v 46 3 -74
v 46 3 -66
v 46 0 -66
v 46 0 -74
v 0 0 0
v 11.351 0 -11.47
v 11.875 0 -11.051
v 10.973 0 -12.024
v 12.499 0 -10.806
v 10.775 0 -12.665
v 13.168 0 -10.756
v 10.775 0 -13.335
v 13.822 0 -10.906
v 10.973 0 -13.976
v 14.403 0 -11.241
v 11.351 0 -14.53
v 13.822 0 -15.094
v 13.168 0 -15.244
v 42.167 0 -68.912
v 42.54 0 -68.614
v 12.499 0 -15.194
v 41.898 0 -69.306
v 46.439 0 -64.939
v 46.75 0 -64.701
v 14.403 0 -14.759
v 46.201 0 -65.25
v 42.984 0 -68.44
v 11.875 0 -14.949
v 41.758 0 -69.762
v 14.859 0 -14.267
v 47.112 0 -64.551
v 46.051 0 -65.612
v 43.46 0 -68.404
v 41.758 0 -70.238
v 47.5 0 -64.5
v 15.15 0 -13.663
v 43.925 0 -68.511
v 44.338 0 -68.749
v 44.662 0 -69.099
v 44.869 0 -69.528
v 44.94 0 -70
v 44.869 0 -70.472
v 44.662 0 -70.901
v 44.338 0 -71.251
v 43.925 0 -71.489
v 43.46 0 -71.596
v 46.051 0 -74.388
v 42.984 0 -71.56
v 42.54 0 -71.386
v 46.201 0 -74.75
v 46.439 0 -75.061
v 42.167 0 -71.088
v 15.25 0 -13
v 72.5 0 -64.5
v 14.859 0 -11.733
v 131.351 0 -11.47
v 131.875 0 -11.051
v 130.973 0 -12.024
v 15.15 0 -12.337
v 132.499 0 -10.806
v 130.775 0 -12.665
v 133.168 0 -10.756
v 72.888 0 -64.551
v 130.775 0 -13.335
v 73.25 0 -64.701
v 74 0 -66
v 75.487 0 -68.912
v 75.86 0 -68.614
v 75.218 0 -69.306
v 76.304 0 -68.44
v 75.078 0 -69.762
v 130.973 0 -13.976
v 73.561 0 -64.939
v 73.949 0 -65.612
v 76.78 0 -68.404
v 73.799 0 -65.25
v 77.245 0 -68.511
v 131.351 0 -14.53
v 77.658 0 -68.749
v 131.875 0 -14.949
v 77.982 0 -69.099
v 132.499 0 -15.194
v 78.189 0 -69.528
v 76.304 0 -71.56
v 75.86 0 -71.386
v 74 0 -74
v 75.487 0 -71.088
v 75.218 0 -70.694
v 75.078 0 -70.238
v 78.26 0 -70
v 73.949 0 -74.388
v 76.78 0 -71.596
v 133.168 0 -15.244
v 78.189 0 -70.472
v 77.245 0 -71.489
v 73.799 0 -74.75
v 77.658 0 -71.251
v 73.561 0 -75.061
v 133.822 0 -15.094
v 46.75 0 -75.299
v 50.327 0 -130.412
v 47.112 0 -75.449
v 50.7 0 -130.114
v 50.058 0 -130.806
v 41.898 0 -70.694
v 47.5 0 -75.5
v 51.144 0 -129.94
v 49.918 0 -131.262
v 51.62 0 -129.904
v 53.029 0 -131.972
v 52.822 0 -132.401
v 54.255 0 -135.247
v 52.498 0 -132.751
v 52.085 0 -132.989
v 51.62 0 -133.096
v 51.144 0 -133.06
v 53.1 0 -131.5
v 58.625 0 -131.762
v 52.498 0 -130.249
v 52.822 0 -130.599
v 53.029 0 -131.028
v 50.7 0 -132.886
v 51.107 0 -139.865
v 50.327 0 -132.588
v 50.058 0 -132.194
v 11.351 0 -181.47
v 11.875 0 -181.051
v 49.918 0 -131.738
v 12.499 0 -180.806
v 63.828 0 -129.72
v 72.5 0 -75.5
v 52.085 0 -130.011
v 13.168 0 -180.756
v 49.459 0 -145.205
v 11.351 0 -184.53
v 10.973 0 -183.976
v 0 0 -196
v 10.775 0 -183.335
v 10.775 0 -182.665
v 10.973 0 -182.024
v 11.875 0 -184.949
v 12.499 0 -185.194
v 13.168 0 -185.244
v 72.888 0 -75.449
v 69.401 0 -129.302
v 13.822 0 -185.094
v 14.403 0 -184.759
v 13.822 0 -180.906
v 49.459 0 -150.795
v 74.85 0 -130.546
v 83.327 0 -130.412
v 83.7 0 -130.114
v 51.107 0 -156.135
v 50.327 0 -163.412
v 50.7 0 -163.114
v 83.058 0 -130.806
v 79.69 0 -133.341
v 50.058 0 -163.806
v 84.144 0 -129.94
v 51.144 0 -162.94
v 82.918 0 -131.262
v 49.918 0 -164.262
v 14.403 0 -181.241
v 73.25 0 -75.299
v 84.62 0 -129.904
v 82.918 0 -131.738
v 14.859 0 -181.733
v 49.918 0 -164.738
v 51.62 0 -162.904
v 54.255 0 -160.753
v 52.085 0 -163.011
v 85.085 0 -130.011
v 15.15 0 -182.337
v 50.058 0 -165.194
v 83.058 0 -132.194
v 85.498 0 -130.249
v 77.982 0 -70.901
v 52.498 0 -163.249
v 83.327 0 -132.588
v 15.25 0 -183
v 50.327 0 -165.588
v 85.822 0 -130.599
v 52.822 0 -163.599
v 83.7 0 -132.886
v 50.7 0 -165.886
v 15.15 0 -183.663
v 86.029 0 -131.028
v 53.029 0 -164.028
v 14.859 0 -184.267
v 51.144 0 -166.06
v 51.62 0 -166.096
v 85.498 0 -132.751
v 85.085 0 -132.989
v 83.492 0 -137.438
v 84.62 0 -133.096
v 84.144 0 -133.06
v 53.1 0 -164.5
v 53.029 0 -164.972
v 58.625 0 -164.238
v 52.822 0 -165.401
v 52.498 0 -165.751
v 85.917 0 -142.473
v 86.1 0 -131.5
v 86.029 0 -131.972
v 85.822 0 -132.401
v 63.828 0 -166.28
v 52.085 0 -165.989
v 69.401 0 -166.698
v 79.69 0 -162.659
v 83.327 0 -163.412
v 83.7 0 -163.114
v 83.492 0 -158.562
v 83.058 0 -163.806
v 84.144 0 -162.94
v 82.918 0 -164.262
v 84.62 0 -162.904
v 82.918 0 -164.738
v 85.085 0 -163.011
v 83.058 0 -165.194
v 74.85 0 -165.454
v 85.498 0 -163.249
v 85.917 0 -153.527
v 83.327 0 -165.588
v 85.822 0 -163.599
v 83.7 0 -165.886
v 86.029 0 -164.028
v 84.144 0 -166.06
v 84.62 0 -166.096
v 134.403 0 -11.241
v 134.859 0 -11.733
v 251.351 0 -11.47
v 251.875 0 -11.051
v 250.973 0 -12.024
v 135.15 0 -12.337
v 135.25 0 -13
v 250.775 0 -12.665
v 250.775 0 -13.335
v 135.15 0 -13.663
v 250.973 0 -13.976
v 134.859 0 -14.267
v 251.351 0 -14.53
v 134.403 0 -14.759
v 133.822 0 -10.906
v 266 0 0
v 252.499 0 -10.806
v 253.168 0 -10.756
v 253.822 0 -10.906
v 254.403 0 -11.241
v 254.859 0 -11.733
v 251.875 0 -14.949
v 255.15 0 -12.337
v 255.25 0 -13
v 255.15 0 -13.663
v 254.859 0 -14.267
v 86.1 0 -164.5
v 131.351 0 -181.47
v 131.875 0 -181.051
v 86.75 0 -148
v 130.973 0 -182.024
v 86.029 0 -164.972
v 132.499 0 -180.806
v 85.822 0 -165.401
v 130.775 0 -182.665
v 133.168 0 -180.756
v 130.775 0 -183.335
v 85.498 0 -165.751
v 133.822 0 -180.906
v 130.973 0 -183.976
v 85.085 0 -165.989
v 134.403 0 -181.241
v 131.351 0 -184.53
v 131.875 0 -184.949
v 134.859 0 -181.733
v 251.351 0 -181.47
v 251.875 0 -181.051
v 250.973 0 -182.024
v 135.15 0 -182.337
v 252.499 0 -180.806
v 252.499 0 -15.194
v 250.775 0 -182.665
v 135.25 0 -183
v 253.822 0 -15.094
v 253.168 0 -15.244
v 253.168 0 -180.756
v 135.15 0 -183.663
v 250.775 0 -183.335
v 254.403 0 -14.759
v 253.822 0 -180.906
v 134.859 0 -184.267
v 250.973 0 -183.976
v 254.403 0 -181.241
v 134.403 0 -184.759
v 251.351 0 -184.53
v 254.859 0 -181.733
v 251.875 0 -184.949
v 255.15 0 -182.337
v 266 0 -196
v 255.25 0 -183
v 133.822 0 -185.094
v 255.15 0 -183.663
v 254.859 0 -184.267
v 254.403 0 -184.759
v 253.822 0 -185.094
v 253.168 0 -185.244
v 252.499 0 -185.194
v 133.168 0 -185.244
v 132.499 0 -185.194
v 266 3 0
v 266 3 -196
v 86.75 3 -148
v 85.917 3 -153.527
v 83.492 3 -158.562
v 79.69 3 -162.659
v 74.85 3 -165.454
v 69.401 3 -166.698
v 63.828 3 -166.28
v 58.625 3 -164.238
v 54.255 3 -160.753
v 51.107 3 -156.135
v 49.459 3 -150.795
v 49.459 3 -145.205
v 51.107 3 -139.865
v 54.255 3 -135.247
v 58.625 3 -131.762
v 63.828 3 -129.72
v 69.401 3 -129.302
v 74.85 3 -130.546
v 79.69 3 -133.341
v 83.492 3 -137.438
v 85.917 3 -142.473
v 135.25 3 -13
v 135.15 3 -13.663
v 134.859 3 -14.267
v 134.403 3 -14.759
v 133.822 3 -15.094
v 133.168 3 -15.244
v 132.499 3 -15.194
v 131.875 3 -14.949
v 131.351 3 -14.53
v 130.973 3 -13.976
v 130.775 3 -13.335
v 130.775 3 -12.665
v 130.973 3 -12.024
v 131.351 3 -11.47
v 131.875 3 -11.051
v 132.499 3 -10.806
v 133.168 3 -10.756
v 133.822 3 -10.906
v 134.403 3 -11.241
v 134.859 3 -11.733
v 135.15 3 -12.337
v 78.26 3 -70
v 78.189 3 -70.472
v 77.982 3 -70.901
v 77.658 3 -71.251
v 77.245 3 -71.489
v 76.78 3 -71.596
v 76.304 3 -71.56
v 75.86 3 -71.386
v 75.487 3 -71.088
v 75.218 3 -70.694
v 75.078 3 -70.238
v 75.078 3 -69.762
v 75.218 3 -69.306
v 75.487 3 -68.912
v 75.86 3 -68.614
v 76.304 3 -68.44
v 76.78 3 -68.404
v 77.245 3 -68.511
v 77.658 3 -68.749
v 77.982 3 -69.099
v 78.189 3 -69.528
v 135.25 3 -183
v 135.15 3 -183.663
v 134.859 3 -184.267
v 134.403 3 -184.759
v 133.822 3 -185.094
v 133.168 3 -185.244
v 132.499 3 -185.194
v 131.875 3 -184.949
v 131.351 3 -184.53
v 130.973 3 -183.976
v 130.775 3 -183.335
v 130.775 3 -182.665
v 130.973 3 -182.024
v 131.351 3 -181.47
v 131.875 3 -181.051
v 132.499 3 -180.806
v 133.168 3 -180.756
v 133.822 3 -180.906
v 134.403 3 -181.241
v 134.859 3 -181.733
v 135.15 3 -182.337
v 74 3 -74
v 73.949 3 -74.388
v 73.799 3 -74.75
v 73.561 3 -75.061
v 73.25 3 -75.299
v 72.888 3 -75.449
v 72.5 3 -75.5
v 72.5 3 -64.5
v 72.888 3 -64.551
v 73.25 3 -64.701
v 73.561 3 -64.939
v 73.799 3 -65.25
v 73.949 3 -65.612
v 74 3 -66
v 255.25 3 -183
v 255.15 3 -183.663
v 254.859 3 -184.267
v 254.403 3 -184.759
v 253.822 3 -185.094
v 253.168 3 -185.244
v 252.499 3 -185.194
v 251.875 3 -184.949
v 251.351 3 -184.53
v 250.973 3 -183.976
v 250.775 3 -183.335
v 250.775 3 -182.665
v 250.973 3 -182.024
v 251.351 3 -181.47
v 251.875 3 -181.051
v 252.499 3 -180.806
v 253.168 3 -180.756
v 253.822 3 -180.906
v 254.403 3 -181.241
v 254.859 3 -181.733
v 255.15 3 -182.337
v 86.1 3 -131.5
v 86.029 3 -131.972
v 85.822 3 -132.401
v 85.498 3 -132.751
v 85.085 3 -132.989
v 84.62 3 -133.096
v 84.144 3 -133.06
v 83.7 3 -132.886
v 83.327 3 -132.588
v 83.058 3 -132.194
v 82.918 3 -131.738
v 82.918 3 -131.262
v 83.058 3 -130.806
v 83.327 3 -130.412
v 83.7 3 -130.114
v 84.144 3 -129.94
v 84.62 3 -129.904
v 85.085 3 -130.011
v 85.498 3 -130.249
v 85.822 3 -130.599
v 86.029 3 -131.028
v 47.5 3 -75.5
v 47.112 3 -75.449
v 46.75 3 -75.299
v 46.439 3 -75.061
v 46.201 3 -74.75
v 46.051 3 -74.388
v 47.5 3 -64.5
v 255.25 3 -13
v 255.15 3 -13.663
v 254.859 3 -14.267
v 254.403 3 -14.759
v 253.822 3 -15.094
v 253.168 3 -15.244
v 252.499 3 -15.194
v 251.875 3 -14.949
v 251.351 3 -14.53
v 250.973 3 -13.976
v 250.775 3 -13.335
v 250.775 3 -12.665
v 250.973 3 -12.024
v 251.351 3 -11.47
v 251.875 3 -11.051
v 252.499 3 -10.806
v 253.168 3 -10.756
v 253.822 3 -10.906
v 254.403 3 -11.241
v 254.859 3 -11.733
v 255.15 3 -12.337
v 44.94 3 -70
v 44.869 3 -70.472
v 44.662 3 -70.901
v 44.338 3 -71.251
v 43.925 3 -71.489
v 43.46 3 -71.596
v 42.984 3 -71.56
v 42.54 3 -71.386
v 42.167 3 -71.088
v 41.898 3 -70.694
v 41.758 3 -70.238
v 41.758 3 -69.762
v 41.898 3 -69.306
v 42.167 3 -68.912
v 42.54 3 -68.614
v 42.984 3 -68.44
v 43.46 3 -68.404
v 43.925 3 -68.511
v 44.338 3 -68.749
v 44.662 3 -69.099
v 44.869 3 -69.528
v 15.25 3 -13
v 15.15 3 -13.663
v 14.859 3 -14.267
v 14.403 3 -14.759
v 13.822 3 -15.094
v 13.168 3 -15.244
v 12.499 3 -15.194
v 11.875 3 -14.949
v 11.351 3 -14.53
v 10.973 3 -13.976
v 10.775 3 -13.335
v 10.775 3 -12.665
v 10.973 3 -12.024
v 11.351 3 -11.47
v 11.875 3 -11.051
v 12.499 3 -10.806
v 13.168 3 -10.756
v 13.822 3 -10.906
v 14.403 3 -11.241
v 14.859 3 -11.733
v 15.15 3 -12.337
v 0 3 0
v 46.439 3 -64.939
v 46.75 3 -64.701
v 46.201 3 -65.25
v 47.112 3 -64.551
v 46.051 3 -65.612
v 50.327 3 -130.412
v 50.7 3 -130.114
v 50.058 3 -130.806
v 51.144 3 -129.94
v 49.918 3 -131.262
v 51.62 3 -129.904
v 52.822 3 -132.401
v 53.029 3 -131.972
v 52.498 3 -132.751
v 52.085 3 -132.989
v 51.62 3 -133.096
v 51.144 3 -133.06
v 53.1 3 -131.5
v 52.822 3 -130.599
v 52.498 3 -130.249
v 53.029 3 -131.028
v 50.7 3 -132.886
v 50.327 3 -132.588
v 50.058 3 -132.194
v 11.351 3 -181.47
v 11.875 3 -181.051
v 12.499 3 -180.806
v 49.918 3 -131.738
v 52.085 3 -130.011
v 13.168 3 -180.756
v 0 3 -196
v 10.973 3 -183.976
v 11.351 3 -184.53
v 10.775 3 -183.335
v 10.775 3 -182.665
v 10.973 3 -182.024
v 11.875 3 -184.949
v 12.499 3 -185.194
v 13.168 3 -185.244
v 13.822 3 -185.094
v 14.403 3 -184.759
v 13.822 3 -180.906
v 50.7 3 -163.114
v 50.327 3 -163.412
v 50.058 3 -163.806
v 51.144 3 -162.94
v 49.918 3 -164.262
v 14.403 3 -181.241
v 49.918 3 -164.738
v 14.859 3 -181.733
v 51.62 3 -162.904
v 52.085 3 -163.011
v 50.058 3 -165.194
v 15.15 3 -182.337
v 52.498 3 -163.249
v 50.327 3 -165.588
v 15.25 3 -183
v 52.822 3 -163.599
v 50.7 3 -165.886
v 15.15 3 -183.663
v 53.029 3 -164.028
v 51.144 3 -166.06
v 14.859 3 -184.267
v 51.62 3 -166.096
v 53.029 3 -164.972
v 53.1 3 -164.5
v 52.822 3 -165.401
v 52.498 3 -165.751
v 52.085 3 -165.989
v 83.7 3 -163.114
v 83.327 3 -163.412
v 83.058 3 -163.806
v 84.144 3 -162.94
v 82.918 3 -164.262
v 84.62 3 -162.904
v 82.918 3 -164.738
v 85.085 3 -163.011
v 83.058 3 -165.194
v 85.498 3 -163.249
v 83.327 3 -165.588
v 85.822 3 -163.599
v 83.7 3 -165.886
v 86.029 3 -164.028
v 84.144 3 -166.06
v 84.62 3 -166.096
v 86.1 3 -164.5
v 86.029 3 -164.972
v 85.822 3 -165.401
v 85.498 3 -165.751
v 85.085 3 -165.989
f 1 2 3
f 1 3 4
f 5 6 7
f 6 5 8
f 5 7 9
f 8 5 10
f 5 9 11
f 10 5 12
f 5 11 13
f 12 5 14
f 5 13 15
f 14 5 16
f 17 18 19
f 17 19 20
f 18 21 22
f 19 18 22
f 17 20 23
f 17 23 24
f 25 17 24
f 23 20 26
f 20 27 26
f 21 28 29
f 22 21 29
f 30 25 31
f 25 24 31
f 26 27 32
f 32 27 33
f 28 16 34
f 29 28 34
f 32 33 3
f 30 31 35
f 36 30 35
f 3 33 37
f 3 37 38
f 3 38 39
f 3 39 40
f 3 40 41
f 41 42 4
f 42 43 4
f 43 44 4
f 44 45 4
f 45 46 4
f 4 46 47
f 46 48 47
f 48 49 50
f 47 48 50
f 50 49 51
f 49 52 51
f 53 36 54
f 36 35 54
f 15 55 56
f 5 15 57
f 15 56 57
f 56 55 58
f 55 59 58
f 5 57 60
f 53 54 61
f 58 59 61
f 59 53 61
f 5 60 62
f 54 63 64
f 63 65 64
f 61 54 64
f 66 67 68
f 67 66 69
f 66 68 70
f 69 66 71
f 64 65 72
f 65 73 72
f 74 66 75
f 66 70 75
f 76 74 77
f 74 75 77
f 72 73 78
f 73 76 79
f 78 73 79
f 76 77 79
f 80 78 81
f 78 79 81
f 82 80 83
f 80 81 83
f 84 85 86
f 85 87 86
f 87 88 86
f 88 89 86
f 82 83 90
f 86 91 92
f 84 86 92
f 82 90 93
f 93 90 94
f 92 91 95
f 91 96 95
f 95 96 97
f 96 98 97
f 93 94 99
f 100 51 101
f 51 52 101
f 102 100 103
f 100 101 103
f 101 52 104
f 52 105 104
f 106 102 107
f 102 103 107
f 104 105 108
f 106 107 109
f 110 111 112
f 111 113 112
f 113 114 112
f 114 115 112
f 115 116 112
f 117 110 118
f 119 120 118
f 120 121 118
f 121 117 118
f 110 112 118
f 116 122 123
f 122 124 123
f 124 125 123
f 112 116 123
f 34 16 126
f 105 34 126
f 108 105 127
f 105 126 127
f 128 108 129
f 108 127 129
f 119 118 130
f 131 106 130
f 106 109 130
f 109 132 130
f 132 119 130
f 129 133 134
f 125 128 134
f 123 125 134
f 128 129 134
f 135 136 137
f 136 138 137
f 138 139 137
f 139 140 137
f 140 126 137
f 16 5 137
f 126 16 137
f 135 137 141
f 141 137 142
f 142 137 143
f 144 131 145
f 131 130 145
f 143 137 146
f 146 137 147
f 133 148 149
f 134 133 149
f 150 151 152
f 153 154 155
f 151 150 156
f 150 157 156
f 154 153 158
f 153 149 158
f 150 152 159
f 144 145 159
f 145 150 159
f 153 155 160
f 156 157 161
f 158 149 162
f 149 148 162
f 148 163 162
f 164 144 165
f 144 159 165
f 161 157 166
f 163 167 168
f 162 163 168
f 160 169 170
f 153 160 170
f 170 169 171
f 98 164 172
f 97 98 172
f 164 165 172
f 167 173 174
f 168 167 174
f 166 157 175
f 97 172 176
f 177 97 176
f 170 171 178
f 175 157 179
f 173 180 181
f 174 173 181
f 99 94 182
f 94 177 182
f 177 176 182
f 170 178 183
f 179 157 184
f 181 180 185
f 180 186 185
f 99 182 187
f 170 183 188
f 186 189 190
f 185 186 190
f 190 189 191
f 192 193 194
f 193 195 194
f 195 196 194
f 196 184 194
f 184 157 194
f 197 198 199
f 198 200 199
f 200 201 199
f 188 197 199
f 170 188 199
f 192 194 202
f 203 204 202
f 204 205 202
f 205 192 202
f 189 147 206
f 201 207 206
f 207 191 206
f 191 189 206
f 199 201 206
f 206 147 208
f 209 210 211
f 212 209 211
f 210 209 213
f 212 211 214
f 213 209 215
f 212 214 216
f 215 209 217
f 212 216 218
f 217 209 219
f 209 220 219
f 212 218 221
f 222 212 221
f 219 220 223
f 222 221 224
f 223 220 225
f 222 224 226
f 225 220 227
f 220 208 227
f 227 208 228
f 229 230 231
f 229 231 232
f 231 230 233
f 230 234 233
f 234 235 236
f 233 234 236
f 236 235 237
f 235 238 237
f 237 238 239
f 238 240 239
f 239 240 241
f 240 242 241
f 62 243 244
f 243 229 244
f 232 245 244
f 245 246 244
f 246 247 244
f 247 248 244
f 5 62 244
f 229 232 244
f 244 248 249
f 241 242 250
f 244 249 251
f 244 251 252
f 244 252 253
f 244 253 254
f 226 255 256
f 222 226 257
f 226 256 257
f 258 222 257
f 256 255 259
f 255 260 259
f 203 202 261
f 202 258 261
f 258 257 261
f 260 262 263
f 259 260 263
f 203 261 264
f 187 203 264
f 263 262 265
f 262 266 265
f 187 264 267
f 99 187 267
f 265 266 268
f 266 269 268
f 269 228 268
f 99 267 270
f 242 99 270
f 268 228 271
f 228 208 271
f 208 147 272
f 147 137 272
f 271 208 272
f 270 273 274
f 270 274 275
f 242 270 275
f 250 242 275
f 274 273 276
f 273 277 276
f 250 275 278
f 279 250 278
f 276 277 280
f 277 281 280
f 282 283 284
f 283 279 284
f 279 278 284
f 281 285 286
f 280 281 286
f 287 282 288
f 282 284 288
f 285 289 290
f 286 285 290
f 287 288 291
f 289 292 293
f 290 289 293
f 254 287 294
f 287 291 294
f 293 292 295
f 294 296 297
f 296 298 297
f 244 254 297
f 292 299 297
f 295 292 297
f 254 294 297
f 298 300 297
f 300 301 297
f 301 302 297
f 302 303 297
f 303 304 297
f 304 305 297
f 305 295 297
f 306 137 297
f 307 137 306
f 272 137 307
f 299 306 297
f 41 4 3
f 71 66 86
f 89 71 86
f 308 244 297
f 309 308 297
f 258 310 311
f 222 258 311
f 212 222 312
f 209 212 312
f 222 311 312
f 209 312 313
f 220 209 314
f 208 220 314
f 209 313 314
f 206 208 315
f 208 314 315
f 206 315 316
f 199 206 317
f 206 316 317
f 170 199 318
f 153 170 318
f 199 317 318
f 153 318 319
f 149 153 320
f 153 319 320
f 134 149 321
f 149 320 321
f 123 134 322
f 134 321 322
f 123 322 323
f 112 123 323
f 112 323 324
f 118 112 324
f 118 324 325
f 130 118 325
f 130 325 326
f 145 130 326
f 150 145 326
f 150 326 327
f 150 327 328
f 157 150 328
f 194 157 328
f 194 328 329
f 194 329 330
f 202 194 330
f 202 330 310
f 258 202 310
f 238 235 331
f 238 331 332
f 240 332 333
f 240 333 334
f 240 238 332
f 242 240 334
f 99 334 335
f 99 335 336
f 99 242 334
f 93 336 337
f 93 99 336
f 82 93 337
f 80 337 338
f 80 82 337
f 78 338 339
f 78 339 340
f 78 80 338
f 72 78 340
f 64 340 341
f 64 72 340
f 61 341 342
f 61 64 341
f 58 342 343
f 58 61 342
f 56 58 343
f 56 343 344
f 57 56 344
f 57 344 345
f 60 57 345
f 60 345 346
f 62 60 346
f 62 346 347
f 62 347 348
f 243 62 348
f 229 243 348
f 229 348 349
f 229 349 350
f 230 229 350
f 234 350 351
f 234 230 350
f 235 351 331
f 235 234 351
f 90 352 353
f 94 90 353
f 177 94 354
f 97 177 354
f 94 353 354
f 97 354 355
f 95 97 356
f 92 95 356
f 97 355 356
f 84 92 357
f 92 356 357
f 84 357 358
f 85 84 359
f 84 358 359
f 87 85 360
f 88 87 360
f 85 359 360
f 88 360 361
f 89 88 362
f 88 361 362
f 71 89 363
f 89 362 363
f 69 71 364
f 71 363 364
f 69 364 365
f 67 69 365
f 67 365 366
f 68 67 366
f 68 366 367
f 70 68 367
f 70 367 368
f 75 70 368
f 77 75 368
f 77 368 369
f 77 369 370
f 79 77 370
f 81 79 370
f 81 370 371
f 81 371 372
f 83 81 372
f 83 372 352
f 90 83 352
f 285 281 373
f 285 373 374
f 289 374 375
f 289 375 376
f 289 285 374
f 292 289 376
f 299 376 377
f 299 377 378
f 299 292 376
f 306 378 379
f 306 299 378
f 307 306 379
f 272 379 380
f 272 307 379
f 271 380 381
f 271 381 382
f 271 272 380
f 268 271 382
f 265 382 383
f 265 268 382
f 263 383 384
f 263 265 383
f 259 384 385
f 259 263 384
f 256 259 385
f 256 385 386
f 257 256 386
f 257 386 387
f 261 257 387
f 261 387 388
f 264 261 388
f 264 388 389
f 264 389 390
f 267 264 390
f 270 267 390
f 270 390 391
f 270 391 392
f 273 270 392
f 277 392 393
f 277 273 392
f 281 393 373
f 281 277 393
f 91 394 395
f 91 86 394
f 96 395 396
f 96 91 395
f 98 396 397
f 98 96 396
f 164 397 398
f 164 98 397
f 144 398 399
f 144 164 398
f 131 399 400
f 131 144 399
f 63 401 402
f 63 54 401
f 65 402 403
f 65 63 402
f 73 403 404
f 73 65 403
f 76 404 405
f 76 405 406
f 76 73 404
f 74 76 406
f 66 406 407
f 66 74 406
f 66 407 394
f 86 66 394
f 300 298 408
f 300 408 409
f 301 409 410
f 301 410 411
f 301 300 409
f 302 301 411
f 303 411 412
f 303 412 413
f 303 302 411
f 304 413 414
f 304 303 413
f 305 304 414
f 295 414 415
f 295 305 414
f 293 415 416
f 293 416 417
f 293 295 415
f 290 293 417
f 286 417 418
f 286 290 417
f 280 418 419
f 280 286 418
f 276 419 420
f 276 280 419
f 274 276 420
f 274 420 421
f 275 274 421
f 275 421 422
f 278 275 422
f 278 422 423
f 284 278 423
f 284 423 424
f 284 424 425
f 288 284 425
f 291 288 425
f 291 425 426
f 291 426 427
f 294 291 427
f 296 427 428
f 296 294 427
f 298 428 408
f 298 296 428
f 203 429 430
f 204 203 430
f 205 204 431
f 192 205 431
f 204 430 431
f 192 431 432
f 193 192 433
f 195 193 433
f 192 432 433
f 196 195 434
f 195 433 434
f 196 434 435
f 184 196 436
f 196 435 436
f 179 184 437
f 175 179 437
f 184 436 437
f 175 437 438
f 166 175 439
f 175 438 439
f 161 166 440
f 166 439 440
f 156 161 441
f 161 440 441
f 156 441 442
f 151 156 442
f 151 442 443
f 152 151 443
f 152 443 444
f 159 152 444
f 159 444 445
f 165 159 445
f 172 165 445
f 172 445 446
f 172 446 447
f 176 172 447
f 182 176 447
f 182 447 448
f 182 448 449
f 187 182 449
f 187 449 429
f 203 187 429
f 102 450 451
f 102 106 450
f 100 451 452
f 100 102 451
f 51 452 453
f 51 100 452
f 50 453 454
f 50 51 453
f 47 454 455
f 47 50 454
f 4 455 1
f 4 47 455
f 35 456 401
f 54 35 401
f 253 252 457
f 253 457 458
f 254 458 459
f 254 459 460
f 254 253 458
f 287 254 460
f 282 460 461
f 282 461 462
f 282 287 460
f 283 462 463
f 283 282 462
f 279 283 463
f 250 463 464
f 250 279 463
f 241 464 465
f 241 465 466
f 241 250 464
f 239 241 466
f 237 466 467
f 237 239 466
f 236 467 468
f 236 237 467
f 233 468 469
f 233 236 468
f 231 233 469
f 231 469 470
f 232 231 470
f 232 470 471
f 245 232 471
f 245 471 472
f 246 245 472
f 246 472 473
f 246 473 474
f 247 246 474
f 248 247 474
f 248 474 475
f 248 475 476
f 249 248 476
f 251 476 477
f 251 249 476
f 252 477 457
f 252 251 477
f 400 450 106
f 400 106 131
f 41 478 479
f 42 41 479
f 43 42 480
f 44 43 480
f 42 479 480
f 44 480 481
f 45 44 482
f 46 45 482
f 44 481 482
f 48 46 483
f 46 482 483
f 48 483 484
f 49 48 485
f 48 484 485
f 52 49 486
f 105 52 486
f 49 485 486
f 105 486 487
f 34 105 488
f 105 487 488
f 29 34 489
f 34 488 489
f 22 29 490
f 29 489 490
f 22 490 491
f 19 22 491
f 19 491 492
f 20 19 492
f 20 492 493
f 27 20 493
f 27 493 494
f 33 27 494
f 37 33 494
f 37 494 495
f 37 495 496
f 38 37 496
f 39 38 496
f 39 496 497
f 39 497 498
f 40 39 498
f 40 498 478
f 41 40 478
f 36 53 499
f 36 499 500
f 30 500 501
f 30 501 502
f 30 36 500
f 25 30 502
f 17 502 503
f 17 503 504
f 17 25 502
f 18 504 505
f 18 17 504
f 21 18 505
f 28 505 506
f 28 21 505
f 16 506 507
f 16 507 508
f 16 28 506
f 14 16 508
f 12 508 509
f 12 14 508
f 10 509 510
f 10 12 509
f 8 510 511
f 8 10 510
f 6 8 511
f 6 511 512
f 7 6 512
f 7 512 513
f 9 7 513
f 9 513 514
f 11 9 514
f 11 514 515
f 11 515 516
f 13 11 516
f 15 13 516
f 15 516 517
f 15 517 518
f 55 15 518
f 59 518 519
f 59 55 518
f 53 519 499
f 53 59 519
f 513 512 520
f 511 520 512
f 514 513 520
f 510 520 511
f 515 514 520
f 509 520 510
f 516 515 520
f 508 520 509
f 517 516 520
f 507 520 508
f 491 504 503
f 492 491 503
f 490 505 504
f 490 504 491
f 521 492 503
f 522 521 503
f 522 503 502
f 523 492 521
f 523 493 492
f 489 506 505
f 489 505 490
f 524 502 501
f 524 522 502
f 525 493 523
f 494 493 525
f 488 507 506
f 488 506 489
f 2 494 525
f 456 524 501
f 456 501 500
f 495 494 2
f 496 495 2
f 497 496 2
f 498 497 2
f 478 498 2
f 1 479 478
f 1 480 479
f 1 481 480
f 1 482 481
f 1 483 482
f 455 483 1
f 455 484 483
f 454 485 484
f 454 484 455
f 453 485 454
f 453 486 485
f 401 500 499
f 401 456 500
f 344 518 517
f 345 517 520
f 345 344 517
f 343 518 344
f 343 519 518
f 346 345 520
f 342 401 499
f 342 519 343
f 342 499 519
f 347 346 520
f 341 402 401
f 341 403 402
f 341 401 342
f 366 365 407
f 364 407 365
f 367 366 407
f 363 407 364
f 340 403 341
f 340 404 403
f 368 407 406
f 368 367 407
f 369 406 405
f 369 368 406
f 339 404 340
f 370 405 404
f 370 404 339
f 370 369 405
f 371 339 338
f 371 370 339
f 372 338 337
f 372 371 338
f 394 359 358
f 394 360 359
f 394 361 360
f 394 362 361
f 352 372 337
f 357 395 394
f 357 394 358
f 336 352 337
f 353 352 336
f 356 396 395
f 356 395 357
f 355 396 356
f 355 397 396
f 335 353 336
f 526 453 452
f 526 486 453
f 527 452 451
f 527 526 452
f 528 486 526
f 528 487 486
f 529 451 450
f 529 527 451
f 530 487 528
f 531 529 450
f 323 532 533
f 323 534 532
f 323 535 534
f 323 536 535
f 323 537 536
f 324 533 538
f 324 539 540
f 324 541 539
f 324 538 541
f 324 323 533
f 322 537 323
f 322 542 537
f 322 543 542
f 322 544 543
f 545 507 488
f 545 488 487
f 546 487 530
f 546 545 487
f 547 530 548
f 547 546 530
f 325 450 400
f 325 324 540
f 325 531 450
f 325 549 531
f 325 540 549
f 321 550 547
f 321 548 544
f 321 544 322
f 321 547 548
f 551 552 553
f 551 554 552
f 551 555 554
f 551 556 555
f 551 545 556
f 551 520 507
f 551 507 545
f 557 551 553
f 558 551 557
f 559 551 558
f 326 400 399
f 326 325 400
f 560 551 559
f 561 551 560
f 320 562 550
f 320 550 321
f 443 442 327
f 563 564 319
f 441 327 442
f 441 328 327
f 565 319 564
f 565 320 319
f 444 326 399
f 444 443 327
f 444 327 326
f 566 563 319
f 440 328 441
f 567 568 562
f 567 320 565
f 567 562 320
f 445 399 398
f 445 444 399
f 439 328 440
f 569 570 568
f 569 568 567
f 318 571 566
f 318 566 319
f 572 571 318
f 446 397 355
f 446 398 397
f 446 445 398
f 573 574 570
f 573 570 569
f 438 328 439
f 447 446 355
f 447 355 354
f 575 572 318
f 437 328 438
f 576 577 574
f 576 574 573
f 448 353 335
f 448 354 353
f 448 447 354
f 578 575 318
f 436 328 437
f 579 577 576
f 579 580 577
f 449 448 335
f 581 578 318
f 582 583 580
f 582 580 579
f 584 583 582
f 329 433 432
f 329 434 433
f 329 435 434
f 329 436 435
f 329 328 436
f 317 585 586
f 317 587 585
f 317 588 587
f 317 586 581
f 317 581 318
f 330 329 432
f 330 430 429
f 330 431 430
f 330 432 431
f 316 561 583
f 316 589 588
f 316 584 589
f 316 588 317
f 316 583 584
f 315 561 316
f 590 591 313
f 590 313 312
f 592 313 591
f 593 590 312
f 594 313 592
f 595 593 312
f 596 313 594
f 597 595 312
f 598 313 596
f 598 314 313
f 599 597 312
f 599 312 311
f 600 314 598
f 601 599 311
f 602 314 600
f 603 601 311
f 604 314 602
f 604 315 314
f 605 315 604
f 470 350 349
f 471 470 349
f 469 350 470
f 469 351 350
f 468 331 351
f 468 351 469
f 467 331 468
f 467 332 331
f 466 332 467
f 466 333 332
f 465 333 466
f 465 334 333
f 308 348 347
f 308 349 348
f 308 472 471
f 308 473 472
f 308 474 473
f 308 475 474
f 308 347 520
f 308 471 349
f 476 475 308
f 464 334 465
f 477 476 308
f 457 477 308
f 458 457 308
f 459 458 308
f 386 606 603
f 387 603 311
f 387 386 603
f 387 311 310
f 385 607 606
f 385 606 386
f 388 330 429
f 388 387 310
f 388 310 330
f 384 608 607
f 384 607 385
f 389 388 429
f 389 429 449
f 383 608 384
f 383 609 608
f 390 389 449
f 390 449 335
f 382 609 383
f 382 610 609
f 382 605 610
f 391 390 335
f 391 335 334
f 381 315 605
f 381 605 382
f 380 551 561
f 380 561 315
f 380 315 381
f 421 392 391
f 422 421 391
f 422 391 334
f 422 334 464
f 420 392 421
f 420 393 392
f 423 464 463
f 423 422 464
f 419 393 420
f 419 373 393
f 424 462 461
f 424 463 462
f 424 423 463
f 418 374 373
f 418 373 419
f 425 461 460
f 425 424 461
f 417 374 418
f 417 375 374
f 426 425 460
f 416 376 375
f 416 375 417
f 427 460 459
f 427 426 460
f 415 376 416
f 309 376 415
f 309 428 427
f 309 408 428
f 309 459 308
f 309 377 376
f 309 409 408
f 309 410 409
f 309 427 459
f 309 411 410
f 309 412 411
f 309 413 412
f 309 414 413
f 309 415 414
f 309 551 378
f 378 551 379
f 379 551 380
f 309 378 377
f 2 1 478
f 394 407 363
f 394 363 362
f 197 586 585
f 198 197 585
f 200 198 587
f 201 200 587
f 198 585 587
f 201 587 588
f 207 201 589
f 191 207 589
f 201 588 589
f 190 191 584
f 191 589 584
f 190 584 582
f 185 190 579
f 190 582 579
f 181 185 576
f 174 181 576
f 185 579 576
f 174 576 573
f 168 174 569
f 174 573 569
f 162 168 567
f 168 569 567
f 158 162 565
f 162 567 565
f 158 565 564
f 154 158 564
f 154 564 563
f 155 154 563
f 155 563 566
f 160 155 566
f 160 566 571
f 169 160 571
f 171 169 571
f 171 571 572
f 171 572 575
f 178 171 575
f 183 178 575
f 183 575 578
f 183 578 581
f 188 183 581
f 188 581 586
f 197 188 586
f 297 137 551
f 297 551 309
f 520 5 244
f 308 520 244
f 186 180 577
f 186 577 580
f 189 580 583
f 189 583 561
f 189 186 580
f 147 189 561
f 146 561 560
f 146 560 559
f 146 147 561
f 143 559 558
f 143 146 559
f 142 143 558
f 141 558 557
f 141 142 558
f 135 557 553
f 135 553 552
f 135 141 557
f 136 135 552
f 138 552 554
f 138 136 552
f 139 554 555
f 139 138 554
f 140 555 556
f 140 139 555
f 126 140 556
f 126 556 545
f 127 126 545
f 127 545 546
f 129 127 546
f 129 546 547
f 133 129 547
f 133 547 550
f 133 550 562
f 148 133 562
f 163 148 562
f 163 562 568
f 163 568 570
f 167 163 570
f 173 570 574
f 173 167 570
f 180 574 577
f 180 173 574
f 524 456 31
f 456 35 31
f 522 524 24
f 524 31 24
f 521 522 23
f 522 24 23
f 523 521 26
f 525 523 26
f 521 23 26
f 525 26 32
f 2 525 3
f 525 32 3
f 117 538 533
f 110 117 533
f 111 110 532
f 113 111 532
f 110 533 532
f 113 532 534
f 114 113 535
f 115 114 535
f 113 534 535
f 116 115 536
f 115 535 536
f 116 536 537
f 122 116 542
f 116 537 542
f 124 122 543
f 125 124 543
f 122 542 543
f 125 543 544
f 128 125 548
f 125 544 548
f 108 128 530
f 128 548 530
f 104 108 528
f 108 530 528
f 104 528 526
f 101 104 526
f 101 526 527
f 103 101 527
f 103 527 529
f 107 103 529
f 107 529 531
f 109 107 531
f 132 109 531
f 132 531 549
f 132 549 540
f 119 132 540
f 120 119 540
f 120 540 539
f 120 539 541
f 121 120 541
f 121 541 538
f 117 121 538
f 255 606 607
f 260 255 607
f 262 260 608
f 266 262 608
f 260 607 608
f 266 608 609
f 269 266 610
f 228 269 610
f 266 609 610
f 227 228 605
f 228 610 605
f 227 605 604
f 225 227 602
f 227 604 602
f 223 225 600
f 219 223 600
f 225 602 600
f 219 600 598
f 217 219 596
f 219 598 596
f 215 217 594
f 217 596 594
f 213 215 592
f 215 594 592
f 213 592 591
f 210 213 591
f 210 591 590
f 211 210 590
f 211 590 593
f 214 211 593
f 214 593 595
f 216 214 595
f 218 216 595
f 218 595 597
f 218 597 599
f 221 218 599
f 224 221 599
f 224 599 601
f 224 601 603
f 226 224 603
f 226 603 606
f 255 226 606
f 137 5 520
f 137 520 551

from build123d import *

# Parameters (mm, degrees)
SKETCH_1_W          = 266
SKETCH_1_H          = 196
SKETCH_1_R          = 2.25
EXTRUDE_1_DEPTH     = 3
SKETCH_3_R          = 18.75
SKETCH_3_R_2        = 1.6
CUT_EXTRUDE_1_DEPTH = 4
SKETCH1_R           = 1.6
SKETCH1_W           = 28
SKETCH1_H           = 11
CUT_EXTRUDE1_DEPTH  = 4
FILLET1_R           = 1.5


with BuildPart() as part:
    # Эскиз1 → Бобышка-Вытянуть1 (new body)
    with BuildSketch(Plane(origin=(0, 0, 0), x_dir=(1, 0, 0), z_dir=(0, 1, 0))):
        with Locations((133, 98)):
            Rectangle(SKETCH_1_W, SKETCH_1_H)
        with Locations((13, 183)):
            Circle(SKETCH_1_R, mode=Mode.SUBTRACT)
        with Locations((253, 183)):
            Circle(SKETCH_1_R, mode=Mode.SUBTRACT)
        with Locations((253, 13)):
            Circle(SKETCH_1_R, mode=Mode.SUBTRACT)
        with Locations((13, 13)):
            Circle(SKETCH_1_R, mode=Mode.SUBTRACT)
        with Locations((133, 13)):
            Circle(SKETCH_1_R, mode=Mode.SUBTRACT)
        with Locations((133, 183)):
            Circle(SKETCH_1_R, mode=Mode.SUBTRACT)
    extrude(amount=EXTRUDE_1_DEPTH)

    # Эскиз3 → Вырез-Вытянуть1 (cut, through all)
    with BuildSketch(Plane(origin=(0, 3, 0), x_dir=(1, 0, 0), z_dir=(0, 1, 0))):
        with Locations((68, 148)):
            Circle(SKETCH_3_R)
        with Locations((84.5, 164.5)):
            Circle(SKETCH_3_R_2)
        with Locations((84.5, 131.5)):
            Circle(SKETCH_3_R_2)
        with Locations((51.5, 131.5)):
            Circle(SKETCH_3_R_2)
        with Locations((51.5, 164.5)):
            Circle(SKETCH_3_R_2)
    extrude(amount=-CUT_EXTRUDE_1_DEPTH, mode=Mode.SUBTRACT)

    # Sketch1 → Cut-Extrude1 (cut, through all)
    with BuildSketch(Plane(origin=(0, 3, 0), x_dir=(1, 0, 0), z_dir=(0, 1, 0))):
        with Locations((43.34, 70)):
            Circle(SKETCH1_R)
        with Locations((76.66, 70)):
            Circle(SKETCH1_R)
        with Locations((60, 70)):
            Rectangle(SKETCH1_W, SKETCH1_H)
    extrude(amount=-CUT_EXTRUDE1_DEPTH, mode=Mode.SUBTRACT)

    # Fillet1
    fillet1_edges = [part.edges().sort_by_distance(p)[0] for p in [
        (46, 1.5, -75.5),
        (74, 1.5, -75.5),
        (74, 1.5, -64.5),
        (46, 1.5, -64.5),
    ]]
    fillet(fillet1_edges, radius=FILLET1_R)


solid = part.part
